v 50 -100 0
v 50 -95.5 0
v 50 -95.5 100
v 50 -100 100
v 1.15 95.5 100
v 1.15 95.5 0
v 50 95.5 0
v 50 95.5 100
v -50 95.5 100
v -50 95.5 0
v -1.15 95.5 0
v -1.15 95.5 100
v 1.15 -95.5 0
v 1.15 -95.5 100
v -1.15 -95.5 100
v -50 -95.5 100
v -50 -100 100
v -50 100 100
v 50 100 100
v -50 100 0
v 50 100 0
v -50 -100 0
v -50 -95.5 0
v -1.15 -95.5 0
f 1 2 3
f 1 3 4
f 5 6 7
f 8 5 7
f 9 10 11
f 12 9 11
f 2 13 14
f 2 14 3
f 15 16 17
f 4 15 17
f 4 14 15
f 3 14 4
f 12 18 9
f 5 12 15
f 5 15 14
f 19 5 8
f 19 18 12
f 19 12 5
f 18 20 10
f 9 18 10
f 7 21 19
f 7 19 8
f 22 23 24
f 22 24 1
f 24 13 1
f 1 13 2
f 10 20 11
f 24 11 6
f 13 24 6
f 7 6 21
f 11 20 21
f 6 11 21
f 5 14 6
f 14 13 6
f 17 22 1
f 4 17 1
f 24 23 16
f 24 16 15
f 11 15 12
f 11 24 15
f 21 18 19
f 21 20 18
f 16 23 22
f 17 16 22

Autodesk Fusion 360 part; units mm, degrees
sketch "スケッチ1" plane through (0, 0, 0) normal (0, 0, 1) x (1, 0, 0)
  line L0 (0, -95.5) -> (0, 95.5)
  line L1 (-50, 100) -> (50, 100)
  line L2 (-50, -100) -> (50, -100)
  line L3 (1.15, -95.5) -> (1.15, 95.5)
  line L4 (-1.15, -95.5) -> (-1.15, 95.5)
  line L5 (-50, -95.5) -> (-1.15, -95.5)
  line L6 (1.15, -95.5) -> (50, -95.5)
  line L7 (-50, 95.5) -> (-1.15, 95.5)
  line L8 (1.15, 95.5) -> (50, 95.5)
  line L9 (50, 100) -> (50, 95.5)
  line L10 (-50, 100) -> (-50, 95.5)
  line L11 (-50, -95.5) -> (-50, -100)
  line L12 (50, -95.5) -> (50, -100)
  dimension "d2" = 100
  dimension "d3" = 100
extrude "押し出し1" add sketch "スケッチ1" along normal blind 100
